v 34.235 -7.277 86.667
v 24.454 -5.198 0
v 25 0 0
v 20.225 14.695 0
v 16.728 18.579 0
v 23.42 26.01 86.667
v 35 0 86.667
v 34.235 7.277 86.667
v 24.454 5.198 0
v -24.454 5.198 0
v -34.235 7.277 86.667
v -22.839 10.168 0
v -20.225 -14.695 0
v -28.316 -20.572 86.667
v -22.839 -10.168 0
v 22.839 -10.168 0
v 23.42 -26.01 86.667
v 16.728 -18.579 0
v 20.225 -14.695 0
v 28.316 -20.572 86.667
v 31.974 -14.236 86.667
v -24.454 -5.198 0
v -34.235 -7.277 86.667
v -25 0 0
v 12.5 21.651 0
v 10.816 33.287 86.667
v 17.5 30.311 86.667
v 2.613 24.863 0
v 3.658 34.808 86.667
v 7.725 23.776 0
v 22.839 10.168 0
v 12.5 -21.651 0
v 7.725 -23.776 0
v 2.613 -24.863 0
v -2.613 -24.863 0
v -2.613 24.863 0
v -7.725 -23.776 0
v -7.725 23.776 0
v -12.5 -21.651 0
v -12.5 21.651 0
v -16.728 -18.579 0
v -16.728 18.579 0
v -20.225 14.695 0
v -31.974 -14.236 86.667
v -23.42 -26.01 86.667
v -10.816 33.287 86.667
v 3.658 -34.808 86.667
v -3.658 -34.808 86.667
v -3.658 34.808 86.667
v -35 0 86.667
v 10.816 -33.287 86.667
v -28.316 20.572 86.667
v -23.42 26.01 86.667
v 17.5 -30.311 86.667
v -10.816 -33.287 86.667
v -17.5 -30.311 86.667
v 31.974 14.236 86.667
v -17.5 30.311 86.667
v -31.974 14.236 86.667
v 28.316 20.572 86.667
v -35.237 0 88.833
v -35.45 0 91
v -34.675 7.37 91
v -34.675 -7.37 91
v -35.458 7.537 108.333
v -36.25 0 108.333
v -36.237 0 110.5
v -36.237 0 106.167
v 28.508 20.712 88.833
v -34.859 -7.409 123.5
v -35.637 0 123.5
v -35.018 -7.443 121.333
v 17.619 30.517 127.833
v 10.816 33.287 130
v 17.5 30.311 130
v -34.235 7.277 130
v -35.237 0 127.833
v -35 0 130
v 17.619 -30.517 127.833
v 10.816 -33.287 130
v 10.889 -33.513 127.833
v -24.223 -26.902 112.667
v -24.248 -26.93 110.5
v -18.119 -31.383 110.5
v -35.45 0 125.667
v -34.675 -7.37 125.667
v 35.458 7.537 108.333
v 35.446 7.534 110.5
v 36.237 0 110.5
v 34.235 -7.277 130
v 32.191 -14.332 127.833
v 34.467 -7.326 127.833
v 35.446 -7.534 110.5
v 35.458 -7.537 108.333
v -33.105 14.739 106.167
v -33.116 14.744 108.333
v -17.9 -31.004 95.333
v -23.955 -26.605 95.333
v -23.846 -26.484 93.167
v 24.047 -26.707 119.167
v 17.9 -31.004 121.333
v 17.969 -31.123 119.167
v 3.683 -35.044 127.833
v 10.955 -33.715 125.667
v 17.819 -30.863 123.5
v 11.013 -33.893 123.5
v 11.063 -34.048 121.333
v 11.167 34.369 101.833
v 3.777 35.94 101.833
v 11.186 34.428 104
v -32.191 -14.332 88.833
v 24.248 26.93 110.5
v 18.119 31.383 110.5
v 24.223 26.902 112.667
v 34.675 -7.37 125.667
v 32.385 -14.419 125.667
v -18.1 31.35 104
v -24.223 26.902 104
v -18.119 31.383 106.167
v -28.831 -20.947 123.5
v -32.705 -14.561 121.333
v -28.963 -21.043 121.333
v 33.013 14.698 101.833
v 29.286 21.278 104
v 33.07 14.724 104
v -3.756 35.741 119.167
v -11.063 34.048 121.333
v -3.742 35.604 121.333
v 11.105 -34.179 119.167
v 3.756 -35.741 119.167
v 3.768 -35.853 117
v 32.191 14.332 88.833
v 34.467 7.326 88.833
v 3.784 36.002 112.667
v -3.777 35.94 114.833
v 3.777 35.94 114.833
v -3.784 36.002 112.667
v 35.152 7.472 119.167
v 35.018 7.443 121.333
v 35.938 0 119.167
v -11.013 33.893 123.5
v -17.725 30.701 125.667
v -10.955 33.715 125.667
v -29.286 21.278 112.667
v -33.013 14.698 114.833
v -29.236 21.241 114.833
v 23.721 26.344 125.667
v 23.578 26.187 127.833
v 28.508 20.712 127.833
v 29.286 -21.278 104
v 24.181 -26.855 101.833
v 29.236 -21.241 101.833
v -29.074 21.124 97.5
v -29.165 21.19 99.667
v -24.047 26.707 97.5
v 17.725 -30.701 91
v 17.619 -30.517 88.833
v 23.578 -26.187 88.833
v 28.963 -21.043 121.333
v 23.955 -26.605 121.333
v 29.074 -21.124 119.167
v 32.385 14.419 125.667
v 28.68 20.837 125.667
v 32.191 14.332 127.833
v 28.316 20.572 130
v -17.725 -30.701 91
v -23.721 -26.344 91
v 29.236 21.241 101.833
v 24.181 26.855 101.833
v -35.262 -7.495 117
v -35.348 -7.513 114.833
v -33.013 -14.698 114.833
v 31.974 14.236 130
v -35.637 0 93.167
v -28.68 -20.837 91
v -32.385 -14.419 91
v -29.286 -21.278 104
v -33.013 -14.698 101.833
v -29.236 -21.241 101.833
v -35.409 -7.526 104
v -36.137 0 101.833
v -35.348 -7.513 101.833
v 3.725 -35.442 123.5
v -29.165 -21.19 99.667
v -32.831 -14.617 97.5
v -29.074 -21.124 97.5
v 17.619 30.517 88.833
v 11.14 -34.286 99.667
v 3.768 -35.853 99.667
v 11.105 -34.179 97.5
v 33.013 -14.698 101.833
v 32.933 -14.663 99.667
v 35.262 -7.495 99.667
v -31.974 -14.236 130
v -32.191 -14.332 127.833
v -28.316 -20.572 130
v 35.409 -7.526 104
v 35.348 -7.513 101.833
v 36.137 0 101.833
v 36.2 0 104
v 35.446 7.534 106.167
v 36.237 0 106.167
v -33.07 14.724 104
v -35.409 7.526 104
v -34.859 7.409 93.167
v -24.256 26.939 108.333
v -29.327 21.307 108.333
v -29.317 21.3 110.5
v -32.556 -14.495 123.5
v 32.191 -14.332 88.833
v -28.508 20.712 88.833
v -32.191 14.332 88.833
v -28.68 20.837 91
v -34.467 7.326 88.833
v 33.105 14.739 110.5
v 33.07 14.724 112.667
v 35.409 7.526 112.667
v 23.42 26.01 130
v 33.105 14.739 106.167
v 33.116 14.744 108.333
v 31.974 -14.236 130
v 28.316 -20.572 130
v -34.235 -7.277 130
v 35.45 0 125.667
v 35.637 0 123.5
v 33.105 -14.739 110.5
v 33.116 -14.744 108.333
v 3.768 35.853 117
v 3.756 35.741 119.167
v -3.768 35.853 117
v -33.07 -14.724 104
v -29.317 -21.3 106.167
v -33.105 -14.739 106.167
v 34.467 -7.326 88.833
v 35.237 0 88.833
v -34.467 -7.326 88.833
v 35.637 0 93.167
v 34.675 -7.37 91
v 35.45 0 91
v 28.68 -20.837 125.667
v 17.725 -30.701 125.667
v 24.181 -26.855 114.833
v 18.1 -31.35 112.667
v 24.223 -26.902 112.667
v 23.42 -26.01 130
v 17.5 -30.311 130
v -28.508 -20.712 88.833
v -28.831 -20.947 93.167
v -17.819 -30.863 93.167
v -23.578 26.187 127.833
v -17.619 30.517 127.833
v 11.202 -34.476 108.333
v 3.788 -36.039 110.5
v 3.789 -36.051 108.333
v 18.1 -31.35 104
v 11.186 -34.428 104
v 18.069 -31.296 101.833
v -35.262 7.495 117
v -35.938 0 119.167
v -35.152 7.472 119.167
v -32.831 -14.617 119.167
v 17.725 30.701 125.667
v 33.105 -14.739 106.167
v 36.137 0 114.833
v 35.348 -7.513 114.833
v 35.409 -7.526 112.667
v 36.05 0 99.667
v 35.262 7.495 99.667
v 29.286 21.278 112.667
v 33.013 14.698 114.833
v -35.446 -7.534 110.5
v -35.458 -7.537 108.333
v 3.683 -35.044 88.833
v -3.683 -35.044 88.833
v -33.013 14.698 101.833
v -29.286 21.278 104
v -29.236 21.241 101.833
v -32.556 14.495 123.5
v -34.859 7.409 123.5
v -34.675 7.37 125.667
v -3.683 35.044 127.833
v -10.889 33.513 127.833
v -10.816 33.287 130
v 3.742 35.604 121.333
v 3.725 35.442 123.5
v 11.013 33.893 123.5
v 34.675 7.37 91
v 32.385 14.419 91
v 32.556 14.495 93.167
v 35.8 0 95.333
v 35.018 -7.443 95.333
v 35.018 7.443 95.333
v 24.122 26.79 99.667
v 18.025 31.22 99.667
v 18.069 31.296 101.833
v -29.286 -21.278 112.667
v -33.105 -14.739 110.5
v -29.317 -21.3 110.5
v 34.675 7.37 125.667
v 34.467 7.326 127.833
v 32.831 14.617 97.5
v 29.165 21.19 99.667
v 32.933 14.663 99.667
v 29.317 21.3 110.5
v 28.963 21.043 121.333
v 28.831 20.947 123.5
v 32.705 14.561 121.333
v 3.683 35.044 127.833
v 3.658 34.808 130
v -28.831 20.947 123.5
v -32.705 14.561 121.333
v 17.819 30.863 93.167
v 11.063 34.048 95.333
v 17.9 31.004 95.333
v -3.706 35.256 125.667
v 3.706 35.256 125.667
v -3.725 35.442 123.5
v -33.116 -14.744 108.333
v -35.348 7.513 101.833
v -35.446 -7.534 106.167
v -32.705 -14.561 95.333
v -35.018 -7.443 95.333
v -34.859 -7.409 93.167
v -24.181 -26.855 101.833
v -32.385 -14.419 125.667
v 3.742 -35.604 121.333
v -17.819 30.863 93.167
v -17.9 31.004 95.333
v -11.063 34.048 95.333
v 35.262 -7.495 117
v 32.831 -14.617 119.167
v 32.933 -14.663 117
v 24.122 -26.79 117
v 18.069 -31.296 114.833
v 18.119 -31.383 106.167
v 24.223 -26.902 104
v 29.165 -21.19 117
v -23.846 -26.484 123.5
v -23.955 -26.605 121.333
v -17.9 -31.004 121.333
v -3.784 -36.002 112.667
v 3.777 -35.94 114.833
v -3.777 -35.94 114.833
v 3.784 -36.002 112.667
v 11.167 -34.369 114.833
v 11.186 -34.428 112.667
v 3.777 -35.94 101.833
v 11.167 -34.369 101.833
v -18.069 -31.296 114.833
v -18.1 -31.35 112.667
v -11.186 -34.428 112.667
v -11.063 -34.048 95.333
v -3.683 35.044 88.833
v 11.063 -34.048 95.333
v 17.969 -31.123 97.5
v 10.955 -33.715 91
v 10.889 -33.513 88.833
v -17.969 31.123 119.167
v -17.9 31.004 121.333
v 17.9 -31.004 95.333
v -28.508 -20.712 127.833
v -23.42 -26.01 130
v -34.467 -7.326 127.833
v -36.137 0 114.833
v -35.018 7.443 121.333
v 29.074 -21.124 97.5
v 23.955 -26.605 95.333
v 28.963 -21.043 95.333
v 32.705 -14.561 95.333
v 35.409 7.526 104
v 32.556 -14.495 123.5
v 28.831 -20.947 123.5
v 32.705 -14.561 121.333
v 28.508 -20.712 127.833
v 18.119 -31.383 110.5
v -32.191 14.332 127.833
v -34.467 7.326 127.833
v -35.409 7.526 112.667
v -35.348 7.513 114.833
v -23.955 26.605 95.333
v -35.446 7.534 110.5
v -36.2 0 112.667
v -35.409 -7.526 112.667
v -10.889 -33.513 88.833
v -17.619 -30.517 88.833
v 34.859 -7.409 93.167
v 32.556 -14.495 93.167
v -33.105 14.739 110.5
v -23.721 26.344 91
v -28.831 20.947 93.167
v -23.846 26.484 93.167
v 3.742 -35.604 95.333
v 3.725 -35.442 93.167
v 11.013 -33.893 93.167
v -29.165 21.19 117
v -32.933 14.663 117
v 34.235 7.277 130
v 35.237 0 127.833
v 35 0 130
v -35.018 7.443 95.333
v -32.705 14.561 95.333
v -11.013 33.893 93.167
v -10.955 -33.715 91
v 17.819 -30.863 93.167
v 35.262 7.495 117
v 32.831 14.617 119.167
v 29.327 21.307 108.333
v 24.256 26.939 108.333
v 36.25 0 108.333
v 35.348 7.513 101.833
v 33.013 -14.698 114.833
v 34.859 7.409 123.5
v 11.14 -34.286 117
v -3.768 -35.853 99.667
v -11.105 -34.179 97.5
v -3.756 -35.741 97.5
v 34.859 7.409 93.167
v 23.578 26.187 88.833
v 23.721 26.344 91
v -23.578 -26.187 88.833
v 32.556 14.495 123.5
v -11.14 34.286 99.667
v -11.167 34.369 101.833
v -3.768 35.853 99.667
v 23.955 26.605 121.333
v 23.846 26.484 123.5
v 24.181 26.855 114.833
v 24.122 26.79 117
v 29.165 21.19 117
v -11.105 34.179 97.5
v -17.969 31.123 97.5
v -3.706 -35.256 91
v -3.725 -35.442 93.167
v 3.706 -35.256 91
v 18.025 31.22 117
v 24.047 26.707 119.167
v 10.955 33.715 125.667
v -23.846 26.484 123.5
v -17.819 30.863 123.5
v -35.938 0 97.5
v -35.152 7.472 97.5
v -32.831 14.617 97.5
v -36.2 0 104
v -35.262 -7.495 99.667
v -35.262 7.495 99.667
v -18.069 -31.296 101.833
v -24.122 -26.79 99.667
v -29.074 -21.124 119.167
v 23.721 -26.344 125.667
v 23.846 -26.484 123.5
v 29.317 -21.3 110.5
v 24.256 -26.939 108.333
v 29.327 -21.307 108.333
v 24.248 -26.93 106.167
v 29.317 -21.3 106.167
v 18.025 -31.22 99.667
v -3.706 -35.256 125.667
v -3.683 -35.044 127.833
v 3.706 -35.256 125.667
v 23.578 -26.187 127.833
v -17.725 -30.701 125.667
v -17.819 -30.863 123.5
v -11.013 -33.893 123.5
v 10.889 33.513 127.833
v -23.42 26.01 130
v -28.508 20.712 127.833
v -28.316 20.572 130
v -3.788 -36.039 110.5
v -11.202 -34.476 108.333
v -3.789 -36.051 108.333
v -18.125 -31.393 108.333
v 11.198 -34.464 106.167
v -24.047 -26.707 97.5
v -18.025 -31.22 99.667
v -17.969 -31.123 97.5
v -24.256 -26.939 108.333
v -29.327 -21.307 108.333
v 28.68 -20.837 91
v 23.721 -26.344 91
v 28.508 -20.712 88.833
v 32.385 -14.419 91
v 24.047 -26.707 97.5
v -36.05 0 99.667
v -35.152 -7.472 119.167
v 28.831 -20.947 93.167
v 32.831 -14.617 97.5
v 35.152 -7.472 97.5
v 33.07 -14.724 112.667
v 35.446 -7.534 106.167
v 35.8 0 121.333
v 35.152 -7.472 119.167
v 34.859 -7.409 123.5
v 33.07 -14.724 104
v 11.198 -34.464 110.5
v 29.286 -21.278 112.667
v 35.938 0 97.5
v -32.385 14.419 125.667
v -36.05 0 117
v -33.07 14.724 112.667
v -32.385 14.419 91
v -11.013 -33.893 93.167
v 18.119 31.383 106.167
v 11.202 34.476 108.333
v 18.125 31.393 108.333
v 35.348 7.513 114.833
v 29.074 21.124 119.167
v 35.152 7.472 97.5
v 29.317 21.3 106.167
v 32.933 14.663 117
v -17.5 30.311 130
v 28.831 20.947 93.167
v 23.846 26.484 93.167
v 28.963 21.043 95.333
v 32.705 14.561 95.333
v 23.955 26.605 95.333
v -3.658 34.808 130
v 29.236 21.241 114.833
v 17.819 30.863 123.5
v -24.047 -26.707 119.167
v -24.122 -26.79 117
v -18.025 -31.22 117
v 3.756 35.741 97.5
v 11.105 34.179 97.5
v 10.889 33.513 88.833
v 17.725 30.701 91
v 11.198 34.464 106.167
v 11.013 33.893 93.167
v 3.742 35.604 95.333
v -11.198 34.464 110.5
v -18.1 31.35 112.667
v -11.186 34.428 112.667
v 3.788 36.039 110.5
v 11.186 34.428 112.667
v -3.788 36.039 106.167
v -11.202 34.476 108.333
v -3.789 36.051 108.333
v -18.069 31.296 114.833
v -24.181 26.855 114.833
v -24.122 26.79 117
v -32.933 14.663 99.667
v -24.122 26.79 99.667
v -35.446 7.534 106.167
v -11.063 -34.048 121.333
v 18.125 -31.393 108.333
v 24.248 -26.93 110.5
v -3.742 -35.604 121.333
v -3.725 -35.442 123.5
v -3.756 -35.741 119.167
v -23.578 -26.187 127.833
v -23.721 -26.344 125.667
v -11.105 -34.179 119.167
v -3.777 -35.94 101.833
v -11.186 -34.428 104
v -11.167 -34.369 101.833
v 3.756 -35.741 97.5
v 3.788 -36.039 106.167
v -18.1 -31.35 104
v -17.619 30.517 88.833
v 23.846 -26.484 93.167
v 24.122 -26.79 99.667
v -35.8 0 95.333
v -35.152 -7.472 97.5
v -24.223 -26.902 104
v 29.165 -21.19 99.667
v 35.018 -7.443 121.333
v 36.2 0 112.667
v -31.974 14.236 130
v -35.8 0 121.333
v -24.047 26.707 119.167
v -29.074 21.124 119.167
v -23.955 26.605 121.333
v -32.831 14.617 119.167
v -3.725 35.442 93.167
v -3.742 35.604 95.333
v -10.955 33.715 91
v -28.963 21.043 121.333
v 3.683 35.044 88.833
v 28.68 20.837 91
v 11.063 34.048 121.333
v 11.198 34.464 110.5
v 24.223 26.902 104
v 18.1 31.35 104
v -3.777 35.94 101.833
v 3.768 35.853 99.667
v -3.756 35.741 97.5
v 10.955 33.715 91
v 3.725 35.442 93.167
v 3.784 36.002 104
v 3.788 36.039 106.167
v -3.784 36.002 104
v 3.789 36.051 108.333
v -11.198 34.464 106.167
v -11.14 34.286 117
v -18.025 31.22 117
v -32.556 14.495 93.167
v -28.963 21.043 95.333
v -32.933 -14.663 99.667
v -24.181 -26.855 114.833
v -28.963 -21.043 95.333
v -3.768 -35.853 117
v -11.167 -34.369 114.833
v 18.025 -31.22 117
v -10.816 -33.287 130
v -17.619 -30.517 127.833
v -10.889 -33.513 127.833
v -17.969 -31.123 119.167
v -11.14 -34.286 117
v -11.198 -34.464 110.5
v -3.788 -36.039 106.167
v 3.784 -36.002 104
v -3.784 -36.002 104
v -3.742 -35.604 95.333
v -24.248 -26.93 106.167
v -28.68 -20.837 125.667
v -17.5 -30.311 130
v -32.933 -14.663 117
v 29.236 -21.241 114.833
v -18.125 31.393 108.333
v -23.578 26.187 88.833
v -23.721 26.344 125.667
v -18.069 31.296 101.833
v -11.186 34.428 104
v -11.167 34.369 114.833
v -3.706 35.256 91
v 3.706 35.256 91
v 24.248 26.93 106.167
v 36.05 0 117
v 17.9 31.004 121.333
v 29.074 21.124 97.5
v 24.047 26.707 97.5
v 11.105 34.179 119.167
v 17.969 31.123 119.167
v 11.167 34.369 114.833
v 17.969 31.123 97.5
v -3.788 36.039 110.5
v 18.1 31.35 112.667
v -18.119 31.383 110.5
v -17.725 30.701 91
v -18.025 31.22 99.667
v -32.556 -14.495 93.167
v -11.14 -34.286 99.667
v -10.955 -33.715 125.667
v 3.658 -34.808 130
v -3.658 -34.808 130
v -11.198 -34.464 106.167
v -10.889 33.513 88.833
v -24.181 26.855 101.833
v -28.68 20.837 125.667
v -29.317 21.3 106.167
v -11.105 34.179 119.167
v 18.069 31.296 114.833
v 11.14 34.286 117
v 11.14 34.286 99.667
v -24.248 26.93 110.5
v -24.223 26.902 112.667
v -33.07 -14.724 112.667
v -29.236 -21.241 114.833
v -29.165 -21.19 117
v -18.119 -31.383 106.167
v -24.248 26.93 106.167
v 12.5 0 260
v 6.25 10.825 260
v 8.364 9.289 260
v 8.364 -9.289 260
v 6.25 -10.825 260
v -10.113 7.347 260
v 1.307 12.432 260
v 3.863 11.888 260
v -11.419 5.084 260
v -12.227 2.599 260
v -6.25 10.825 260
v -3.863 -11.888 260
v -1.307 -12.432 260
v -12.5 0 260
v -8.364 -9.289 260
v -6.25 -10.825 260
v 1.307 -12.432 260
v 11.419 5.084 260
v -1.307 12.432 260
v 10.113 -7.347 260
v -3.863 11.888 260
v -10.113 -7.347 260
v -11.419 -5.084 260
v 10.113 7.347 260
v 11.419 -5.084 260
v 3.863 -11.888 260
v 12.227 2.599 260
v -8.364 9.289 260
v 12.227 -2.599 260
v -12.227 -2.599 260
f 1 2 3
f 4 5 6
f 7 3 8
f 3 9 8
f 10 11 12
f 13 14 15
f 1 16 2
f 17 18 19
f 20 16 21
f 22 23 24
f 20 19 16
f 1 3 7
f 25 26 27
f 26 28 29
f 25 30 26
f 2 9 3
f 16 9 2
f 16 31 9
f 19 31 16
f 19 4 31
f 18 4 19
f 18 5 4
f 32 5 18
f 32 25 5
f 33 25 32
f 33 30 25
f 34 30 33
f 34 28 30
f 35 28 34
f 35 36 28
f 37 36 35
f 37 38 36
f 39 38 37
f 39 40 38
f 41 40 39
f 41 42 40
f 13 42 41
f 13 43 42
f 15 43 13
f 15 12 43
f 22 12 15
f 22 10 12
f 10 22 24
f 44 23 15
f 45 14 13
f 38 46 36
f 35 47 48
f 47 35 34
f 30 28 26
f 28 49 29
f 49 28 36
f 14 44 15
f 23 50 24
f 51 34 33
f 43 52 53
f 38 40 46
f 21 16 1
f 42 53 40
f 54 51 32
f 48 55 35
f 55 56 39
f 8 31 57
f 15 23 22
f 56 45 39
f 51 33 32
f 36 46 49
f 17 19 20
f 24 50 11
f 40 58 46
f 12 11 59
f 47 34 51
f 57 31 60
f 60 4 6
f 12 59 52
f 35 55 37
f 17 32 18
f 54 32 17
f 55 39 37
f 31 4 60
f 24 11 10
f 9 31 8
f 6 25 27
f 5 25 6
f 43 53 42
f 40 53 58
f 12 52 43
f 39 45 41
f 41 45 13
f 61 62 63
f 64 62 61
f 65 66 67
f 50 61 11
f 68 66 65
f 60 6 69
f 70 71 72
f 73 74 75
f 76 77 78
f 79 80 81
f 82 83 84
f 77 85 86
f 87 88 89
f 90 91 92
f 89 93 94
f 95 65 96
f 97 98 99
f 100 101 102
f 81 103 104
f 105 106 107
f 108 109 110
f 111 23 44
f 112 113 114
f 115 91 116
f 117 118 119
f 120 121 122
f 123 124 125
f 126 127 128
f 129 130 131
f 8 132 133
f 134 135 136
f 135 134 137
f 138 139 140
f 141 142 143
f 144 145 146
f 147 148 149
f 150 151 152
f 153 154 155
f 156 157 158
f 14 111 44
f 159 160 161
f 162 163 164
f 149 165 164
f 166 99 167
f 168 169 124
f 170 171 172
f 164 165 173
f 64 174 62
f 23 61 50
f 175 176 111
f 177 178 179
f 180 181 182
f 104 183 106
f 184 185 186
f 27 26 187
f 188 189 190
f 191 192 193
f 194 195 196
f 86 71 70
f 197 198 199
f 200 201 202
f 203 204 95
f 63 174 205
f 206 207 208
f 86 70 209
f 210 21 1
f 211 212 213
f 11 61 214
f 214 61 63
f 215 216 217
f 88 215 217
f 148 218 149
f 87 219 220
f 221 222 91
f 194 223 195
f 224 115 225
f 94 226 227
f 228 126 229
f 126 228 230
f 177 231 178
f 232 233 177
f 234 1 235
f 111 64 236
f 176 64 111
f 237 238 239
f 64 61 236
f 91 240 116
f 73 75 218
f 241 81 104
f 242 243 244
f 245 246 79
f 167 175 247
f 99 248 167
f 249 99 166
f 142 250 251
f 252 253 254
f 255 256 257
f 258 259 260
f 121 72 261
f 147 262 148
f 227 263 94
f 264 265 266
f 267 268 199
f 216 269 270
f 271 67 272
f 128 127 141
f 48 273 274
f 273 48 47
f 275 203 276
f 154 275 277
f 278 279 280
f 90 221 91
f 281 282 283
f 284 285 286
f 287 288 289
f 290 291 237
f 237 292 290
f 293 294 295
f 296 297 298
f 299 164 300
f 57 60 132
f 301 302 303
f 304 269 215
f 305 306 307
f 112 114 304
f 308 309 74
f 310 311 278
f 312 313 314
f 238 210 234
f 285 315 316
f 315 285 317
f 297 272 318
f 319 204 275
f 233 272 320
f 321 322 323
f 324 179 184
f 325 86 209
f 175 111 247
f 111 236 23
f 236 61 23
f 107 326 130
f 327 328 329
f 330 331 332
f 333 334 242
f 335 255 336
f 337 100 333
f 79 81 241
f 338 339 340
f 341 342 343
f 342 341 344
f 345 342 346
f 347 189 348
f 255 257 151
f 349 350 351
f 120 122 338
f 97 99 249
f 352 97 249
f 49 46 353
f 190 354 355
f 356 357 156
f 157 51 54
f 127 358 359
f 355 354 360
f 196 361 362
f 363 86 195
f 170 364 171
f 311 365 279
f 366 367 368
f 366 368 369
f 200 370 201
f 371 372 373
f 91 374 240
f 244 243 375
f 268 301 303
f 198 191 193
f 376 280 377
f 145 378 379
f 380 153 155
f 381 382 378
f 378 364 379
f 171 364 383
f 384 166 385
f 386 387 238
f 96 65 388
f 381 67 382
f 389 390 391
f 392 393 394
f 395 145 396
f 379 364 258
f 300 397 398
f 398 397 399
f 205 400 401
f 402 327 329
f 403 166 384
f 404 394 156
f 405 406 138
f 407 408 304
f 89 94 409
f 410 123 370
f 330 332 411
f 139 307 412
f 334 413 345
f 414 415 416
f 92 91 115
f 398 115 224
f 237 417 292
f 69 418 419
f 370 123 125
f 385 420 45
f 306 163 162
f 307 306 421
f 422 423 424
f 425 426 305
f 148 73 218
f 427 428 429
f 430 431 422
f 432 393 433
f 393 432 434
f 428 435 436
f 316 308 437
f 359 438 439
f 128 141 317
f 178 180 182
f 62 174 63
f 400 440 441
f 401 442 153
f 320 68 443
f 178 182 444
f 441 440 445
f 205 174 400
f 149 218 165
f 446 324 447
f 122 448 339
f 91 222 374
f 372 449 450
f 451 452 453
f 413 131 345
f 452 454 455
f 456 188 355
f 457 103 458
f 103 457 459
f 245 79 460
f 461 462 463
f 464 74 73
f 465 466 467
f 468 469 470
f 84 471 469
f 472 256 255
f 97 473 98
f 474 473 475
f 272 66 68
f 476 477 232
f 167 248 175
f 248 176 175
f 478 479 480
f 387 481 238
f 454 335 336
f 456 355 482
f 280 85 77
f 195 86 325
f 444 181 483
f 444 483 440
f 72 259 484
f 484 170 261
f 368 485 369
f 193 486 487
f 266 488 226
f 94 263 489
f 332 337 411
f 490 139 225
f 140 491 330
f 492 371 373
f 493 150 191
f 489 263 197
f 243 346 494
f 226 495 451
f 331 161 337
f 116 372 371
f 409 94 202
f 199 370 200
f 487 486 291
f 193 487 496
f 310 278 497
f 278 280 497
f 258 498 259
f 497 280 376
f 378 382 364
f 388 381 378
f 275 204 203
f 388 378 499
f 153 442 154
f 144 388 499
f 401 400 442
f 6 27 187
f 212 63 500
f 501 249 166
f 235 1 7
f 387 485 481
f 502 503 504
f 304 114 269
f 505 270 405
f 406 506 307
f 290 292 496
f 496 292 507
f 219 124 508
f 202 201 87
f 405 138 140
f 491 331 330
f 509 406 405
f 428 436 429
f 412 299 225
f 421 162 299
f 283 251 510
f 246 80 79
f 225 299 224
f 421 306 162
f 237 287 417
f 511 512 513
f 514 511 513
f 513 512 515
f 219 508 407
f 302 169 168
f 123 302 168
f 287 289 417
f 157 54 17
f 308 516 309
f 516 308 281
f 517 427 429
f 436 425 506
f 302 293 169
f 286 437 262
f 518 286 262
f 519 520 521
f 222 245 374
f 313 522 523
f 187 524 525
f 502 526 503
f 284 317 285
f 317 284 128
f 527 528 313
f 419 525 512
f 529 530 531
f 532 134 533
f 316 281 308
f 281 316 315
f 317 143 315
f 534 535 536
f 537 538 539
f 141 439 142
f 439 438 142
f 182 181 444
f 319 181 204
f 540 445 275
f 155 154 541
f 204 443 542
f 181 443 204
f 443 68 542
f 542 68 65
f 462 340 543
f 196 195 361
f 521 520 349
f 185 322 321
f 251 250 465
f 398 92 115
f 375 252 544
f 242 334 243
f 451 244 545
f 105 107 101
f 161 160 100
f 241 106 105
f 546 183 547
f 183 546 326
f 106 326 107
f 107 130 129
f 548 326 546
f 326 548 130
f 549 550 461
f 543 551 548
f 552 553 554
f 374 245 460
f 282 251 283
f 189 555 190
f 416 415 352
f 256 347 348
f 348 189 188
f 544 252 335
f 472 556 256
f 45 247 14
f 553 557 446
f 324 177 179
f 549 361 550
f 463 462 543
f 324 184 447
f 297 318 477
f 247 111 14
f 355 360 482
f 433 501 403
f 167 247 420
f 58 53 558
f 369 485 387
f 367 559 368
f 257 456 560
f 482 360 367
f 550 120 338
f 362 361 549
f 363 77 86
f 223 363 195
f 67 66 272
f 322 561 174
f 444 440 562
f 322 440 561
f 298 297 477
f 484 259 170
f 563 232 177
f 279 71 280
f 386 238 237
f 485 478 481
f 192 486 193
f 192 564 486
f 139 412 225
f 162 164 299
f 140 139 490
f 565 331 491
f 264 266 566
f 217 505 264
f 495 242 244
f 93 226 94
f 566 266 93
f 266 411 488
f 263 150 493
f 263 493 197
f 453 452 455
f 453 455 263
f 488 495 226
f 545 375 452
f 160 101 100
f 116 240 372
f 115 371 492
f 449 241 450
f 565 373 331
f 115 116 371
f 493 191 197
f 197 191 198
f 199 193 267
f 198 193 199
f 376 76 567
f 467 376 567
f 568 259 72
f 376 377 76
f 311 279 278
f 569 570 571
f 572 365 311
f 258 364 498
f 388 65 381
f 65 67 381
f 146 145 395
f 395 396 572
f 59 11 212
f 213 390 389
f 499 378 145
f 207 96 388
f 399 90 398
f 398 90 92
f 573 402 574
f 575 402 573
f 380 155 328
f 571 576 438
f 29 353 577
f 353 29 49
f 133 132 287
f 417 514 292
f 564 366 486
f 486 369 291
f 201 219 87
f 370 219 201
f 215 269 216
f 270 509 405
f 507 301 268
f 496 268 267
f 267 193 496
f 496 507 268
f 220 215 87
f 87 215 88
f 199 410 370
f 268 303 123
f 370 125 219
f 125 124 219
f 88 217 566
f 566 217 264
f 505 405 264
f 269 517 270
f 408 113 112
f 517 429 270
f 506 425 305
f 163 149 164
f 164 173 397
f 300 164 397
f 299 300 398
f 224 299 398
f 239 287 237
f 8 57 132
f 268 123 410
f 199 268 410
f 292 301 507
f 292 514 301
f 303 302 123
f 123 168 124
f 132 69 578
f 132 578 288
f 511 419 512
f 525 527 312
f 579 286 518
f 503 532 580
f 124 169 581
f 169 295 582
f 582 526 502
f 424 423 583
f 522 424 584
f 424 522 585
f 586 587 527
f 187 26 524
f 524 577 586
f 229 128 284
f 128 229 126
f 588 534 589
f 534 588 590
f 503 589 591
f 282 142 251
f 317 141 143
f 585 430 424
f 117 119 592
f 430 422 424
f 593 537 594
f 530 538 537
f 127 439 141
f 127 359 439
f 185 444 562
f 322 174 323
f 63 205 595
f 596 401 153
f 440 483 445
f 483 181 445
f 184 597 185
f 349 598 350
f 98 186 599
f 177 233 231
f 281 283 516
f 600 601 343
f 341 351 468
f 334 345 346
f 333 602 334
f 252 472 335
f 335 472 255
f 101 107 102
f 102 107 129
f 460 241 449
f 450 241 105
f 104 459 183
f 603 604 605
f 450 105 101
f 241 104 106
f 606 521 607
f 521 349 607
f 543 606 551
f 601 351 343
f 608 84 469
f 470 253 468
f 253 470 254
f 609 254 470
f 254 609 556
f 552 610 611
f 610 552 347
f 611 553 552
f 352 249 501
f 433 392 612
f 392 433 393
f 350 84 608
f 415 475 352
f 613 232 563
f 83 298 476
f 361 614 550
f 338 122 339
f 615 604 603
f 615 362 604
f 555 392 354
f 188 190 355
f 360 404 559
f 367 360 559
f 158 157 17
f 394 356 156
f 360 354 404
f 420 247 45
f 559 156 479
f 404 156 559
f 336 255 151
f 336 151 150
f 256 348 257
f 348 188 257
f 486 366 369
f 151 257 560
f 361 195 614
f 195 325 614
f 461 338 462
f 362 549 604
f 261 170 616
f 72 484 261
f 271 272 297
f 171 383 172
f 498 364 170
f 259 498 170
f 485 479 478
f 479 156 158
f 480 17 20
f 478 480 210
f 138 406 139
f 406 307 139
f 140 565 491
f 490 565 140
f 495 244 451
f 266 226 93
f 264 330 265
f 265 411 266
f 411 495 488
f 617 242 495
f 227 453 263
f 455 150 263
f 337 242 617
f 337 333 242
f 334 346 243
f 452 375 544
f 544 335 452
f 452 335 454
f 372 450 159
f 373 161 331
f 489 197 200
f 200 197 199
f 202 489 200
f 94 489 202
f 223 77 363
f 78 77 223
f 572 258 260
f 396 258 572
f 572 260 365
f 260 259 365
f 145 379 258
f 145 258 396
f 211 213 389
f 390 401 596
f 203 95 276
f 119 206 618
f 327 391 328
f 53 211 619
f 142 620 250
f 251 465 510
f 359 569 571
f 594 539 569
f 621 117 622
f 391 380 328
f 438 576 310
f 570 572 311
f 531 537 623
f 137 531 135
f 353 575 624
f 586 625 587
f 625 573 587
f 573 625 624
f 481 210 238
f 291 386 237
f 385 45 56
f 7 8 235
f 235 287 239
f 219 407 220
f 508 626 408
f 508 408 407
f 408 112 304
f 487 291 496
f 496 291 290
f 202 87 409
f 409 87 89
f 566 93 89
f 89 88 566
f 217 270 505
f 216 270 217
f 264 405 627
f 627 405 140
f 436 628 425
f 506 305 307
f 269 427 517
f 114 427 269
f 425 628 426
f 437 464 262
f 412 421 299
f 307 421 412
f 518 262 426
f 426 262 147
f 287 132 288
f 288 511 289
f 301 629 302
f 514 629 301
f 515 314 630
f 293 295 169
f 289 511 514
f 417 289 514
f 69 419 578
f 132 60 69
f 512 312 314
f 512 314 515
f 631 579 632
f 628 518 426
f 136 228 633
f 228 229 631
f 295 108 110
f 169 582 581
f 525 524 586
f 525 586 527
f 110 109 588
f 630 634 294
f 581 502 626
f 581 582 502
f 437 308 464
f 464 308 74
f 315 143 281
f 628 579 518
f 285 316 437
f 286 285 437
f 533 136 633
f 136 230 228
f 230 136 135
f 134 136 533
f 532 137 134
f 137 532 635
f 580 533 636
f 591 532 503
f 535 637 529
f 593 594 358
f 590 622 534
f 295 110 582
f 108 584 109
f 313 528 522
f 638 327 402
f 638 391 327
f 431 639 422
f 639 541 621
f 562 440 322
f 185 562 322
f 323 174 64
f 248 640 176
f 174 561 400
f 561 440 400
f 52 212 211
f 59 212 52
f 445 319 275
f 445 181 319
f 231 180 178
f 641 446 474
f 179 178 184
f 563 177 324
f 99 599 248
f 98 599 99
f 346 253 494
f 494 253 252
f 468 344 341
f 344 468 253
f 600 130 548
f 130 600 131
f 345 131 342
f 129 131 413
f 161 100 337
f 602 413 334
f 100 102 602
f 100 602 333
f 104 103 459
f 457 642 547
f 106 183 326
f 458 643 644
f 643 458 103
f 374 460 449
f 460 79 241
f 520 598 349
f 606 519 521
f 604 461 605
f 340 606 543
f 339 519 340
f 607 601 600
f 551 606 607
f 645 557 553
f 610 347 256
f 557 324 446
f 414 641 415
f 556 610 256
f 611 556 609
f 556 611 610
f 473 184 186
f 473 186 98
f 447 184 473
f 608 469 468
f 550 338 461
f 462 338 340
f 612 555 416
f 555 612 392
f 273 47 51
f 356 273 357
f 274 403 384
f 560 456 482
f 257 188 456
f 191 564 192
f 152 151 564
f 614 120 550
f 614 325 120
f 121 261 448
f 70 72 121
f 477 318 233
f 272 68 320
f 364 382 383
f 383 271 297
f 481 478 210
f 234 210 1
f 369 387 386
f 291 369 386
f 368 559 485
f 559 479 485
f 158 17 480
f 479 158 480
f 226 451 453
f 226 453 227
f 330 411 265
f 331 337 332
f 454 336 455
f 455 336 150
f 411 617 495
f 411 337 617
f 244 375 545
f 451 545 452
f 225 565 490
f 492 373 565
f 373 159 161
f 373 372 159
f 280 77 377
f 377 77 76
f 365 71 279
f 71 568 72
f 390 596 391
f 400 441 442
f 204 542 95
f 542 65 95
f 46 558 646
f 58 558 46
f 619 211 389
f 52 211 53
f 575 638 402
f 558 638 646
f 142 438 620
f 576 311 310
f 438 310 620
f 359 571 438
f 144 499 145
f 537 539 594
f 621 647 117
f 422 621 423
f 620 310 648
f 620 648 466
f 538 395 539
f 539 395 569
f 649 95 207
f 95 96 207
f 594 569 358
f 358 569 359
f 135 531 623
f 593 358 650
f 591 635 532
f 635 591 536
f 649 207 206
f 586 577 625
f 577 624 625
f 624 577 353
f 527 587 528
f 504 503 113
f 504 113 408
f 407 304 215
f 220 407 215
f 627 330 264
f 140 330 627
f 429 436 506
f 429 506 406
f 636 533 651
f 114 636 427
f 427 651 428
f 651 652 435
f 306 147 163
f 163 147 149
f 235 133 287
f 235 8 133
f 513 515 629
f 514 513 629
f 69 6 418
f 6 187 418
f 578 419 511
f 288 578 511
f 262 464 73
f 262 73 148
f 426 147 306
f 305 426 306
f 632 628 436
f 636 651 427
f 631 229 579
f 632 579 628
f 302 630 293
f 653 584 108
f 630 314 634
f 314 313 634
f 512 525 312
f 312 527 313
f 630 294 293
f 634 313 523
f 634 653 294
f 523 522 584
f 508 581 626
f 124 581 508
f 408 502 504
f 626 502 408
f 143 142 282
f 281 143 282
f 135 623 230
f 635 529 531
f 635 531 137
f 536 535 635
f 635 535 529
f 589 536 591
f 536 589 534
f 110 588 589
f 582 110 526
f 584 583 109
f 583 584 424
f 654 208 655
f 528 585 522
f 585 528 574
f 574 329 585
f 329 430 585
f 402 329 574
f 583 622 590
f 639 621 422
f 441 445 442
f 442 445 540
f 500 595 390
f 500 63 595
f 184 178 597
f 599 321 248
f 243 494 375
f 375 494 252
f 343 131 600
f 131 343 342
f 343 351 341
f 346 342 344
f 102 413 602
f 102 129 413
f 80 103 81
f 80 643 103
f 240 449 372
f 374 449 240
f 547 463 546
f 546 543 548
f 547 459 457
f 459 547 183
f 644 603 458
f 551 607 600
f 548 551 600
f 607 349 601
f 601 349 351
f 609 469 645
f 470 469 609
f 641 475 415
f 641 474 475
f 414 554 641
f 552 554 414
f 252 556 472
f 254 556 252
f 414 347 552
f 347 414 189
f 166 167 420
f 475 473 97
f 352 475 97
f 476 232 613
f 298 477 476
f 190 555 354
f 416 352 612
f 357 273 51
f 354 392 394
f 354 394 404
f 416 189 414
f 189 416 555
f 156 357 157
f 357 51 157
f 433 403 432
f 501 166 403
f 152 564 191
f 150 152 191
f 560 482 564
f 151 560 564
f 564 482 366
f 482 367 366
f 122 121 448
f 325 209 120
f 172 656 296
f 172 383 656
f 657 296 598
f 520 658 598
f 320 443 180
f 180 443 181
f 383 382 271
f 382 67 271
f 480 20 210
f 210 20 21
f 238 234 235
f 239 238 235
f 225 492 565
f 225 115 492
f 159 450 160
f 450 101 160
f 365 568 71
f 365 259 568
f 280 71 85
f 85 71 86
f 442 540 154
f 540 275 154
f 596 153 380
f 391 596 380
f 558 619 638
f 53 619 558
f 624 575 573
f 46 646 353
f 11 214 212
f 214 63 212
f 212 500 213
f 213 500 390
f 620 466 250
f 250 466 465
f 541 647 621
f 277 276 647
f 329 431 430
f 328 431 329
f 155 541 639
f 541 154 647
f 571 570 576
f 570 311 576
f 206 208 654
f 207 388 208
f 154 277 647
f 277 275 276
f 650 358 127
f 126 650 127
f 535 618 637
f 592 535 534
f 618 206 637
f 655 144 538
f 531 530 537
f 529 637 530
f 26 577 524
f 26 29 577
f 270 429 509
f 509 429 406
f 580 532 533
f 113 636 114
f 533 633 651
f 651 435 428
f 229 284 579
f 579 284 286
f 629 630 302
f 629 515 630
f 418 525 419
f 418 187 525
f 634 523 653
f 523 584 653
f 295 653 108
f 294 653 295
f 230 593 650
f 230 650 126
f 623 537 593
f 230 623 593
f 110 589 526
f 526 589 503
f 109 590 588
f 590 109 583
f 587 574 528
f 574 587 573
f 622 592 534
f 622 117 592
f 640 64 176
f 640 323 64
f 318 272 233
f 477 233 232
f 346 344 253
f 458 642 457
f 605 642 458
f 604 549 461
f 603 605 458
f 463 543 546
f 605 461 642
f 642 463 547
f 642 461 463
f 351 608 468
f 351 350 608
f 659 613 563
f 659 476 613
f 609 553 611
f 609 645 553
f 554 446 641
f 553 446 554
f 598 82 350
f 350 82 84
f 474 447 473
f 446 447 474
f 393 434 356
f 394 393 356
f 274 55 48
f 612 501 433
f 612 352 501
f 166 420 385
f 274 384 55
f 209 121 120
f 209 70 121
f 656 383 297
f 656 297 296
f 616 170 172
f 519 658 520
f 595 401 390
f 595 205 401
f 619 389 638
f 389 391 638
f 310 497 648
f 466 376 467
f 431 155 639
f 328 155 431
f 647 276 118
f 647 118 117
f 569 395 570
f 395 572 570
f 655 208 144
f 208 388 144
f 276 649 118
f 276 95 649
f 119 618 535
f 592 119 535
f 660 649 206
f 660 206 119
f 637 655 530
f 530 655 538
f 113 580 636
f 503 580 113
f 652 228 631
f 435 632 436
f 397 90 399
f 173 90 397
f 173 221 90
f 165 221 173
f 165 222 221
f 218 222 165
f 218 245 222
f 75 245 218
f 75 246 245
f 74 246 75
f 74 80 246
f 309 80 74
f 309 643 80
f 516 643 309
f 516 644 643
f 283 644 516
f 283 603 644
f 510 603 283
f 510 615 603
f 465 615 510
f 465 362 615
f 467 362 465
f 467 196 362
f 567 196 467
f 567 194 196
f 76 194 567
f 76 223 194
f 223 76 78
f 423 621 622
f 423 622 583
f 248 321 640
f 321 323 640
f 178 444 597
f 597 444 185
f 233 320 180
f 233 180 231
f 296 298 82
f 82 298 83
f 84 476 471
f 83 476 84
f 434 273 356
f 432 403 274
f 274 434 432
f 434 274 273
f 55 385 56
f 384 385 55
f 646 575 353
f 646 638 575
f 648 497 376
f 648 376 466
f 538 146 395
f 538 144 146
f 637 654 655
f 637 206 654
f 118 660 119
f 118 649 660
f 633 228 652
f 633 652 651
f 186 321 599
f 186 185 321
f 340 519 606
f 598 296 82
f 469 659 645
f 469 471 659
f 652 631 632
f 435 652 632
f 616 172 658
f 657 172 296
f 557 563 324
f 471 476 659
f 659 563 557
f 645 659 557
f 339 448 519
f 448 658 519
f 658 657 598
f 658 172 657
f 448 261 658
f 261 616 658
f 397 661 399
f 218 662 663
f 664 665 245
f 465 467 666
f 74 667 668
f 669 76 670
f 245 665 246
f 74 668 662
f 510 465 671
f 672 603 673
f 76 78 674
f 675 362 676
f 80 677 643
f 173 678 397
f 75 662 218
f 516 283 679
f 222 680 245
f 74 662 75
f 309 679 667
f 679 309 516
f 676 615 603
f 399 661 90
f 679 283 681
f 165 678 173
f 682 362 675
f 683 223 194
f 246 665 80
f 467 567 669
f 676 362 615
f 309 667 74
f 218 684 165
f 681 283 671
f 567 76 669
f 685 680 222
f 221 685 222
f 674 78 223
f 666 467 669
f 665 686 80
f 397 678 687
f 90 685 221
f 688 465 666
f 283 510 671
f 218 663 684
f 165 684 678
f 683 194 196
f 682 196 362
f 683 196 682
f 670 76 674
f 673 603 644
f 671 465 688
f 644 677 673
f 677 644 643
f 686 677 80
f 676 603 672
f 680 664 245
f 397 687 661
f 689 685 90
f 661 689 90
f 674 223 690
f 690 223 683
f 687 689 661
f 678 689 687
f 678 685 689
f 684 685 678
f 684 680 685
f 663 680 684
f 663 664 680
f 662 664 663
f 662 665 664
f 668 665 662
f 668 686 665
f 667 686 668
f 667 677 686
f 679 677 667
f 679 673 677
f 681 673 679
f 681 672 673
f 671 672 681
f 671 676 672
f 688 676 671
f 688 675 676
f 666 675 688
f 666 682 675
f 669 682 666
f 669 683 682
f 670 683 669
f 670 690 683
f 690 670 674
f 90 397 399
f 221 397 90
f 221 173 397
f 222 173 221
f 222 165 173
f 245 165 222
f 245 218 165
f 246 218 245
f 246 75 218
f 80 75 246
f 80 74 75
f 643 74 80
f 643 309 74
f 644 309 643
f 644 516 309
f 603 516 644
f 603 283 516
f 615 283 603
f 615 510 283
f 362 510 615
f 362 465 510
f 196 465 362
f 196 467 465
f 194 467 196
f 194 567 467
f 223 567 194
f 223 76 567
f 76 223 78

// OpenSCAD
// This botle looks more like a delphin club: 2 cones (blue and red) and a curve in the middle (green) 

HEIGTH = 260;   // total height of bottle (100-350 ish, default 260)
DIA0 = 50;      // diameter at bottom
DIA1 = 70;      // diameter at beginning of curvy bit
BULBYBIT=75/2;  // (target) radius of bulby bit (not exact)
DIA2 = 70;      // diameter at top of bulby but
DIA3 = 25;      // diameter at top of bottle / start of handle

// do not change below, these are calculated from total height
HC1=HEIGTH/3;   
HC2=HEIGTH/2;
HBB=HEIGTH-HC1-HC2;


points = [[DIA1/2,0],[BULBYBIT,HBB/2],[DIA2/2,HBB]];

curvepoints = [for (i=[0:0.05:1]) bezier(points,i) ];

// Quadratic Bezier curve rastering
// Aart 09-2018 Aartsite.nl
    function bezier (P,t) =
        let(
                x1 = P[0][0] + (( P[1][0] - P[0][0]) *t),
                y1 = P[0][1] + (( P[1][1] - P[0][1]) *t),
                x2 = P[1][0] + (( P[2][0] - P[1][0]) *t),
                y2 = P[1][1] + (( P[2][1] - P[1][1]) *t),
                x=x1+((x2-x1)*t),
                y=y1+((y2-y1)*t)
                ) ([x,y]);

bottlepoly = concat ([[0,0]],curvepoints,[[0,points[2][1]]] ); // TODO: iets om uit de "points" list de begin en eindpunten te halen, maar dan tegen 0 aan. Dus zegmaar points[2][1] oid
echo (bottlepoly);

echo(points[2][1]); // zo dus


color("red") cylinder(d1=DIA0,d2=DIA1,h=HC1);

color("green")  translate([0,0,HC1]) rotate_extrude() polygon(bottlepoly);    

color("blue") translate([0,0,HC1+HBB]) cylinder(d1=DIA2,d2=DIA3,h=HC2);
